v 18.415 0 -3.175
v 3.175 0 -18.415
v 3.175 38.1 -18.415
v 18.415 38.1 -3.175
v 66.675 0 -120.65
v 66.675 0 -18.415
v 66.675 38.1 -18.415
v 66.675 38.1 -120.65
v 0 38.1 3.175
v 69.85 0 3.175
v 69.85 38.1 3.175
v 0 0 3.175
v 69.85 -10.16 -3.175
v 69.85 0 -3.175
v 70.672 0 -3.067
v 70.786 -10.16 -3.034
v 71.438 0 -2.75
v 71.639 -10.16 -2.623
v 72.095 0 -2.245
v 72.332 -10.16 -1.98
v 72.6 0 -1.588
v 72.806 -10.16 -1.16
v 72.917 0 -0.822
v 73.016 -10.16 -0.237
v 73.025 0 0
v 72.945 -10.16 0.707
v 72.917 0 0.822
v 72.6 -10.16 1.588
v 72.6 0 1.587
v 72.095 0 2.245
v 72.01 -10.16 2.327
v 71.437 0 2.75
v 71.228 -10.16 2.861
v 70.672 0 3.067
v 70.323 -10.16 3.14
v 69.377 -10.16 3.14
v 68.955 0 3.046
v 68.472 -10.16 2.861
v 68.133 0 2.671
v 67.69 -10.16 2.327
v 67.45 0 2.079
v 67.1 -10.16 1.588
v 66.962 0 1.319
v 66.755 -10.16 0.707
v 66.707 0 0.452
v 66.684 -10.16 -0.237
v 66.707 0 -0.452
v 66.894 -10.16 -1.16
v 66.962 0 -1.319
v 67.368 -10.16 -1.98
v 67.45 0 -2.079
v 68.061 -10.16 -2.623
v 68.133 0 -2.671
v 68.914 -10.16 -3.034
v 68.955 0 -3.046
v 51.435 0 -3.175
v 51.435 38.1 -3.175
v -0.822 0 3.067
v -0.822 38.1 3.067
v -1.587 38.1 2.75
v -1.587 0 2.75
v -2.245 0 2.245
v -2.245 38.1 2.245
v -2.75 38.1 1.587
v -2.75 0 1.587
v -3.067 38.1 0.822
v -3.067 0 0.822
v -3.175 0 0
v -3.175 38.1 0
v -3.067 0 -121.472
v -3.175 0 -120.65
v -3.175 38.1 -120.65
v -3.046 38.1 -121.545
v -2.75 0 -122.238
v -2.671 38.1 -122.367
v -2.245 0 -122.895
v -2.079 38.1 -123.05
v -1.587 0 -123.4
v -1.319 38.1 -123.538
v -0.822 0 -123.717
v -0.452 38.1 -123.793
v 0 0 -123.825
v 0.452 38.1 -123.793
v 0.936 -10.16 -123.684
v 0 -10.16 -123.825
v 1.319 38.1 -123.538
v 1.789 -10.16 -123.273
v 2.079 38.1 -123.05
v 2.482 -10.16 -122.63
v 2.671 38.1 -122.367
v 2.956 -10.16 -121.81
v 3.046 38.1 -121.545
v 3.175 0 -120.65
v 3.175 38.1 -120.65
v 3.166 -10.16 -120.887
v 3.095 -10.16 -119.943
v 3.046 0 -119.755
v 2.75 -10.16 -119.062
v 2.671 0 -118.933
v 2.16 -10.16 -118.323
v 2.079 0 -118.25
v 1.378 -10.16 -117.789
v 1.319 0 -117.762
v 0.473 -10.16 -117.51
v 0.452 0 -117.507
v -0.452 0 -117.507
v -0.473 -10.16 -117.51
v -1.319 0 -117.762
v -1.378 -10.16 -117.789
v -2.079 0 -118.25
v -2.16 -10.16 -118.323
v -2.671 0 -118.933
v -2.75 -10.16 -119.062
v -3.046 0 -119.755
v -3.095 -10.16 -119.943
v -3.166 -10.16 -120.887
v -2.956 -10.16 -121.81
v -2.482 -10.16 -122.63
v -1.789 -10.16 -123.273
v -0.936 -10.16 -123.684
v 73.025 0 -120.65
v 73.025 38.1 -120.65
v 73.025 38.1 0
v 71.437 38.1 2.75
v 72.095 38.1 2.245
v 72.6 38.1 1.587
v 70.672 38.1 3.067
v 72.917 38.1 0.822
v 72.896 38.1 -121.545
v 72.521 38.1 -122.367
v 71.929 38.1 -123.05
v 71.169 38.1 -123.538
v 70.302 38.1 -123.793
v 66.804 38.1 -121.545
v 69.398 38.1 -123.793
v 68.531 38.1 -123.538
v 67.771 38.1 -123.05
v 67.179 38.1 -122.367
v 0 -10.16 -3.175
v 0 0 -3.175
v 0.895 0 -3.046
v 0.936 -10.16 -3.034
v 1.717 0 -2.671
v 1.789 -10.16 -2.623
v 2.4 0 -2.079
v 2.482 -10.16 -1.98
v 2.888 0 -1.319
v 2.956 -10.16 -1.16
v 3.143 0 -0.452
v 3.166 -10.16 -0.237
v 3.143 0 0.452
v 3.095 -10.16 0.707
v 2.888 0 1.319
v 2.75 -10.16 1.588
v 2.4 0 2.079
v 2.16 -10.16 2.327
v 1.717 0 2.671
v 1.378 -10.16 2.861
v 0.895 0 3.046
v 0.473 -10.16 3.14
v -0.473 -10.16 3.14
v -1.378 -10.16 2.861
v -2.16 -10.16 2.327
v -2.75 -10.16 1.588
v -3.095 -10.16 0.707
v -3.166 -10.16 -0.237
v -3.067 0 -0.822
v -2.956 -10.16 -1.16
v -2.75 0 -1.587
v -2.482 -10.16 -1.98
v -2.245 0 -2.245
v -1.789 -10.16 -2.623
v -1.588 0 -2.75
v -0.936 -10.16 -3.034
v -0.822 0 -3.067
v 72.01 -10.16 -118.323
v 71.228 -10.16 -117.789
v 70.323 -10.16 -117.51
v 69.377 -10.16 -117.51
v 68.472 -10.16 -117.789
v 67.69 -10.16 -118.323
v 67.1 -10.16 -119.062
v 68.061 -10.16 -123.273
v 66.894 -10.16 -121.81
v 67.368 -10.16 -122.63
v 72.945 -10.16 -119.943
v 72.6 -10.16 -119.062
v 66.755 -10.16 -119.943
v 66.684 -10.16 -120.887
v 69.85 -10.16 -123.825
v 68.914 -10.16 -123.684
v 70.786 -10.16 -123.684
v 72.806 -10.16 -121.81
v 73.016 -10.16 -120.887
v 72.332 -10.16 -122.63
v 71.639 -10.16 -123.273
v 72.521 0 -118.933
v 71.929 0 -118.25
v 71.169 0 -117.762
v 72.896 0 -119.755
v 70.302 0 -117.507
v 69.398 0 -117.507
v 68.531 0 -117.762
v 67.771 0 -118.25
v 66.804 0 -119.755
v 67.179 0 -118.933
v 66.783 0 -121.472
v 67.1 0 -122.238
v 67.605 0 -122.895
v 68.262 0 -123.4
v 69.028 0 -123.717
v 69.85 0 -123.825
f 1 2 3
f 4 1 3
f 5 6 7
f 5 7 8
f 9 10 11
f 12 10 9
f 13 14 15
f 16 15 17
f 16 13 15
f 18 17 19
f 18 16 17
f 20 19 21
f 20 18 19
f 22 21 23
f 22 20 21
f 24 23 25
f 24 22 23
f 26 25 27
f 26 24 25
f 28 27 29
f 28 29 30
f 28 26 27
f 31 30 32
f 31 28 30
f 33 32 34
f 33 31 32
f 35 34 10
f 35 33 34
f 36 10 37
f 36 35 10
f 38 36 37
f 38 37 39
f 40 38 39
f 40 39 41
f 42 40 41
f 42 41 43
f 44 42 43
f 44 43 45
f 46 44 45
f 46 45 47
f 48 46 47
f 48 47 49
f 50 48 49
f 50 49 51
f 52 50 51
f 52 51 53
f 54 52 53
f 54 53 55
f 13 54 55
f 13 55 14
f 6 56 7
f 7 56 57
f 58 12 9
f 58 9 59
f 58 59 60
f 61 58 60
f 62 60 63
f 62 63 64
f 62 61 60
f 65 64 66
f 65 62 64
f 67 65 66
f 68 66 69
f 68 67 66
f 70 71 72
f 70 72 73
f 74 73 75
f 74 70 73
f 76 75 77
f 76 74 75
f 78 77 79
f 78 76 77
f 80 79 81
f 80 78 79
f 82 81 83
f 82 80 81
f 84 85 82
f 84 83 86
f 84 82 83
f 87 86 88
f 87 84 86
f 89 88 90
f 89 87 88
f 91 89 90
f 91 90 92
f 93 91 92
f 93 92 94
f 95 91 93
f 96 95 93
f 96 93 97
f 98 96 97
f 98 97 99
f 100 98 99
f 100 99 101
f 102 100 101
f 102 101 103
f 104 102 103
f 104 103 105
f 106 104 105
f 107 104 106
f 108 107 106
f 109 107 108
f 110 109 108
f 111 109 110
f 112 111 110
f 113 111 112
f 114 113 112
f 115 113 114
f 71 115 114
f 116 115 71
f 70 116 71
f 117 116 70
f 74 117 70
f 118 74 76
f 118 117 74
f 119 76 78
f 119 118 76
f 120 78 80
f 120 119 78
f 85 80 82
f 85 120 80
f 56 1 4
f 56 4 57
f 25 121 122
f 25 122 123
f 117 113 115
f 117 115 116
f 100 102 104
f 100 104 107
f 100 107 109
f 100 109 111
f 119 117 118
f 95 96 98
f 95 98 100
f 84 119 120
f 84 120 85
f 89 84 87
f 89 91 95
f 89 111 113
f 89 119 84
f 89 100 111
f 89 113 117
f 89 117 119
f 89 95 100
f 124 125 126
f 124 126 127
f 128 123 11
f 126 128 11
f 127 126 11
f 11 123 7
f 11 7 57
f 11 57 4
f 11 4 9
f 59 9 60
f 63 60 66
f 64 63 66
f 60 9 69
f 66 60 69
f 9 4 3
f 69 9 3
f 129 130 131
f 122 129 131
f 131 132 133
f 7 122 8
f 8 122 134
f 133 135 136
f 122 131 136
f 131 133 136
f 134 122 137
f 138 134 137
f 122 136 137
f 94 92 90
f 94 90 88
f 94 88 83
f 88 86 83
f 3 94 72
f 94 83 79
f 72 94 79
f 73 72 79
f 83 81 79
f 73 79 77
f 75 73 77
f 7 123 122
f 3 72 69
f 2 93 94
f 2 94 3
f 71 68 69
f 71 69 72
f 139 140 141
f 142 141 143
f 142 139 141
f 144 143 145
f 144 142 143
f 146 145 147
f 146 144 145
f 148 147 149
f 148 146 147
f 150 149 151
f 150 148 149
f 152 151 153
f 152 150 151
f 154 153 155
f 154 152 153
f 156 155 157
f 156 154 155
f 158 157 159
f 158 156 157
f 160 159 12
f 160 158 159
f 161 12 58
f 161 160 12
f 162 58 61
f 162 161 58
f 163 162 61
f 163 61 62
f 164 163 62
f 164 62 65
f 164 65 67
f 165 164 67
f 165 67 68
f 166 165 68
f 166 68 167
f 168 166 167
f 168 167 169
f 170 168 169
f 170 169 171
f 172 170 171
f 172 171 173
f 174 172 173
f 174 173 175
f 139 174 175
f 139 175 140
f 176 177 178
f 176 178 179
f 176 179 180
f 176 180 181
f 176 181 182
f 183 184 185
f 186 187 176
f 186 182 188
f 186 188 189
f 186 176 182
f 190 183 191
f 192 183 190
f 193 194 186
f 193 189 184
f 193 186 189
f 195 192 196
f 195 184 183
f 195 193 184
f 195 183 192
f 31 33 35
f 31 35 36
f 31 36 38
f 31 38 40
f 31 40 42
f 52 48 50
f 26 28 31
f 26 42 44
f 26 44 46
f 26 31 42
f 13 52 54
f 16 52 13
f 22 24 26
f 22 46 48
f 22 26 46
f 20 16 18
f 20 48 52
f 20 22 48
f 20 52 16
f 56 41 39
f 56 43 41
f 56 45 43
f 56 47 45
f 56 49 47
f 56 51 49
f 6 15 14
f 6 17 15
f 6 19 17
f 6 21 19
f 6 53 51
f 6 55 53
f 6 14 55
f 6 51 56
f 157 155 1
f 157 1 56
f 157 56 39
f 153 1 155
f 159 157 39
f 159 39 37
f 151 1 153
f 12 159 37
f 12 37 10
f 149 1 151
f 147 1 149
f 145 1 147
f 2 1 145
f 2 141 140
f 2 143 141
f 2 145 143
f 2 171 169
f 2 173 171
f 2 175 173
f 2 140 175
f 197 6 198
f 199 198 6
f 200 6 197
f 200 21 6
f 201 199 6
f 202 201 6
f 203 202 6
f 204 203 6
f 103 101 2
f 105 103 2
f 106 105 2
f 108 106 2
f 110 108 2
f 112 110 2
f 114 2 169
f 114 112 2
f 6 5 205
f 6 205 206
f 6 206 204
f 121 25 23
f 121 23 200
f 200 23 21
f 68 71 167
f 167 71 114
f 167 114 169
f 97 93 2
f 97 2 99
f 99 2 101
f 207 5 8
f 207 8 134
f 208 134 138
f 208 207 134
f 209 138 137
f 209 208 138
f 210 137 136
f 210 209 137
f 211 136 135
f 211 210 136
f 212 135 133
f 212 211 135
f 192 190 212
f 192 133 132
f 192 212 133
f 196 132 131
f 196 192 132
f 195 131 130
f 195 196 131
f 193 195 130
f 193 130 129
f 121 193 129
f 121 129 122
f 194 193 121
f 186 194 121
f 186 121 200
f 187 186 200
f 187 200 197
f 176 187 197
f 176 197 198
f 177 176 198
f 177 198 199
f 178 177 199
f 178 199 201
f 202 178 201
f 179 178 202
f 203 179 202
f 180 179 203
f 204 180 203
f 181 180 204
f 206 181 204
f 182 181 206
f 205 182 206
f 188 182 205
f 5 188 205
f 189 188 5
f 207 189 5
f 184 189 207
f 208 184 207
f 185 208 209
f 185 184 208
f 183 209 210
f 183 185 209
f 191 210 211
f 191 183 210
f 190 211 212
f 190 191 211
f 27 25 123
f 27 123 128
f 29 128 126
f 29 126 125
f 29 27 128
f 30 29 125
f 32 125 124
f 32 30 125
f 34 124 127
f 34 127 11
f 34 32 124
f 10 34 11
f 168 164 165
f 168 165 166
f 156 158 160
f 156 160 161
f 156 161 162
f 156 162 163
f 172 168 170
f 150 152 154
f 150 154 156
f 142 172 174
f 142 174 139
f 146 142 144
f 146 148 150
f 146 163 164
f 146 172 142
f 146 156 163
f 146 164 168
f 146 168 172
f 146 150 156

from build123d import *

# Parameters (mm, degrees)
BOSS_EXTRUDE1_DEPTH = 38.1
BOSS_EXTRUDE2_START = 10.16
SKETCH2_R           = 3.175
BOSS_EXTRUDE2_DEPTH = 10.16
CHAMFER1_SIZE       = 15.24


with BuildPart() as part:
    # Sketch1 → Boss-Extrude1 (new body)
    with BuildSketch(Plane(origin=(0, 0, 0), x_dir=(1, 0, 0), z_dir=(0, 1, 0))):
        with BuildLine():
            Line((-3.175, 0), (-3.175, 120.65))
            ThreePointArc((-3.175, 120.65), (0, 123.825), (3.175, 120.65))
            Line((3.175, 120.65), (3.175, 3.175))
            Line((3.175, 3.175), (66.675, 3.175))
            Line((66.675, 3.175), (66.675, 120.65))
            ThreePointArc((66.675, 120.65), (69.85, 123.825), (73.025, 120.65))
            Line((73.025, 120.65), (73.025, 0))
            ThreePointArc((73.025, 0), (72.09506403, -2.24506403), (69.85, -3.175))
            Line((69.85, -3.175), (0, -3.175))
            ThreePointArc((0, -3.175), (-2.24506403, -2.24506403), (-3.175, 0))
        make_face()
    extrude(amount=BOSS_EXTRUDE1_DEPTH)

    # Sketch2 → Boss-Extrude2 (add)
    with BuildSketch(Plane(origin=(0, 0, 0), x_dir=(-1, 0, 0), z_dir=(0, -1, 0)).offset(BOSS_EXTRUDE2_START)):
        with Locations(Location((-69.85, 120.65, 0), (0, 0, 90))):
            Circle(SKETCH2_R)
        with Locations(Location((0, 120.65, 0), (0, 0, 90))):
            Circle(SKETCH2_R)
        with Locations(Location((0, 0, 0), (0, 0, 90))):
            Circle(SKETCH2_R)
        with Locations(Location((-69.85, 0, 0), (0, 0, 90))):
            Circle(SKETCH2_R)
    extrude(amount=-BOSS_EXTRUDE2_DEPTH)

    # Chamfer1
    chamfer1_edges = [part.edges().sort_by_distance(p)[0] for p in [
        (3.175, 19.05, -3.175),
        (66.675, 19.05, -3.175),
    ]]
    chamfer(chamfer1_edges, length=CHAMFER1_SIZE)


solid = part.part
